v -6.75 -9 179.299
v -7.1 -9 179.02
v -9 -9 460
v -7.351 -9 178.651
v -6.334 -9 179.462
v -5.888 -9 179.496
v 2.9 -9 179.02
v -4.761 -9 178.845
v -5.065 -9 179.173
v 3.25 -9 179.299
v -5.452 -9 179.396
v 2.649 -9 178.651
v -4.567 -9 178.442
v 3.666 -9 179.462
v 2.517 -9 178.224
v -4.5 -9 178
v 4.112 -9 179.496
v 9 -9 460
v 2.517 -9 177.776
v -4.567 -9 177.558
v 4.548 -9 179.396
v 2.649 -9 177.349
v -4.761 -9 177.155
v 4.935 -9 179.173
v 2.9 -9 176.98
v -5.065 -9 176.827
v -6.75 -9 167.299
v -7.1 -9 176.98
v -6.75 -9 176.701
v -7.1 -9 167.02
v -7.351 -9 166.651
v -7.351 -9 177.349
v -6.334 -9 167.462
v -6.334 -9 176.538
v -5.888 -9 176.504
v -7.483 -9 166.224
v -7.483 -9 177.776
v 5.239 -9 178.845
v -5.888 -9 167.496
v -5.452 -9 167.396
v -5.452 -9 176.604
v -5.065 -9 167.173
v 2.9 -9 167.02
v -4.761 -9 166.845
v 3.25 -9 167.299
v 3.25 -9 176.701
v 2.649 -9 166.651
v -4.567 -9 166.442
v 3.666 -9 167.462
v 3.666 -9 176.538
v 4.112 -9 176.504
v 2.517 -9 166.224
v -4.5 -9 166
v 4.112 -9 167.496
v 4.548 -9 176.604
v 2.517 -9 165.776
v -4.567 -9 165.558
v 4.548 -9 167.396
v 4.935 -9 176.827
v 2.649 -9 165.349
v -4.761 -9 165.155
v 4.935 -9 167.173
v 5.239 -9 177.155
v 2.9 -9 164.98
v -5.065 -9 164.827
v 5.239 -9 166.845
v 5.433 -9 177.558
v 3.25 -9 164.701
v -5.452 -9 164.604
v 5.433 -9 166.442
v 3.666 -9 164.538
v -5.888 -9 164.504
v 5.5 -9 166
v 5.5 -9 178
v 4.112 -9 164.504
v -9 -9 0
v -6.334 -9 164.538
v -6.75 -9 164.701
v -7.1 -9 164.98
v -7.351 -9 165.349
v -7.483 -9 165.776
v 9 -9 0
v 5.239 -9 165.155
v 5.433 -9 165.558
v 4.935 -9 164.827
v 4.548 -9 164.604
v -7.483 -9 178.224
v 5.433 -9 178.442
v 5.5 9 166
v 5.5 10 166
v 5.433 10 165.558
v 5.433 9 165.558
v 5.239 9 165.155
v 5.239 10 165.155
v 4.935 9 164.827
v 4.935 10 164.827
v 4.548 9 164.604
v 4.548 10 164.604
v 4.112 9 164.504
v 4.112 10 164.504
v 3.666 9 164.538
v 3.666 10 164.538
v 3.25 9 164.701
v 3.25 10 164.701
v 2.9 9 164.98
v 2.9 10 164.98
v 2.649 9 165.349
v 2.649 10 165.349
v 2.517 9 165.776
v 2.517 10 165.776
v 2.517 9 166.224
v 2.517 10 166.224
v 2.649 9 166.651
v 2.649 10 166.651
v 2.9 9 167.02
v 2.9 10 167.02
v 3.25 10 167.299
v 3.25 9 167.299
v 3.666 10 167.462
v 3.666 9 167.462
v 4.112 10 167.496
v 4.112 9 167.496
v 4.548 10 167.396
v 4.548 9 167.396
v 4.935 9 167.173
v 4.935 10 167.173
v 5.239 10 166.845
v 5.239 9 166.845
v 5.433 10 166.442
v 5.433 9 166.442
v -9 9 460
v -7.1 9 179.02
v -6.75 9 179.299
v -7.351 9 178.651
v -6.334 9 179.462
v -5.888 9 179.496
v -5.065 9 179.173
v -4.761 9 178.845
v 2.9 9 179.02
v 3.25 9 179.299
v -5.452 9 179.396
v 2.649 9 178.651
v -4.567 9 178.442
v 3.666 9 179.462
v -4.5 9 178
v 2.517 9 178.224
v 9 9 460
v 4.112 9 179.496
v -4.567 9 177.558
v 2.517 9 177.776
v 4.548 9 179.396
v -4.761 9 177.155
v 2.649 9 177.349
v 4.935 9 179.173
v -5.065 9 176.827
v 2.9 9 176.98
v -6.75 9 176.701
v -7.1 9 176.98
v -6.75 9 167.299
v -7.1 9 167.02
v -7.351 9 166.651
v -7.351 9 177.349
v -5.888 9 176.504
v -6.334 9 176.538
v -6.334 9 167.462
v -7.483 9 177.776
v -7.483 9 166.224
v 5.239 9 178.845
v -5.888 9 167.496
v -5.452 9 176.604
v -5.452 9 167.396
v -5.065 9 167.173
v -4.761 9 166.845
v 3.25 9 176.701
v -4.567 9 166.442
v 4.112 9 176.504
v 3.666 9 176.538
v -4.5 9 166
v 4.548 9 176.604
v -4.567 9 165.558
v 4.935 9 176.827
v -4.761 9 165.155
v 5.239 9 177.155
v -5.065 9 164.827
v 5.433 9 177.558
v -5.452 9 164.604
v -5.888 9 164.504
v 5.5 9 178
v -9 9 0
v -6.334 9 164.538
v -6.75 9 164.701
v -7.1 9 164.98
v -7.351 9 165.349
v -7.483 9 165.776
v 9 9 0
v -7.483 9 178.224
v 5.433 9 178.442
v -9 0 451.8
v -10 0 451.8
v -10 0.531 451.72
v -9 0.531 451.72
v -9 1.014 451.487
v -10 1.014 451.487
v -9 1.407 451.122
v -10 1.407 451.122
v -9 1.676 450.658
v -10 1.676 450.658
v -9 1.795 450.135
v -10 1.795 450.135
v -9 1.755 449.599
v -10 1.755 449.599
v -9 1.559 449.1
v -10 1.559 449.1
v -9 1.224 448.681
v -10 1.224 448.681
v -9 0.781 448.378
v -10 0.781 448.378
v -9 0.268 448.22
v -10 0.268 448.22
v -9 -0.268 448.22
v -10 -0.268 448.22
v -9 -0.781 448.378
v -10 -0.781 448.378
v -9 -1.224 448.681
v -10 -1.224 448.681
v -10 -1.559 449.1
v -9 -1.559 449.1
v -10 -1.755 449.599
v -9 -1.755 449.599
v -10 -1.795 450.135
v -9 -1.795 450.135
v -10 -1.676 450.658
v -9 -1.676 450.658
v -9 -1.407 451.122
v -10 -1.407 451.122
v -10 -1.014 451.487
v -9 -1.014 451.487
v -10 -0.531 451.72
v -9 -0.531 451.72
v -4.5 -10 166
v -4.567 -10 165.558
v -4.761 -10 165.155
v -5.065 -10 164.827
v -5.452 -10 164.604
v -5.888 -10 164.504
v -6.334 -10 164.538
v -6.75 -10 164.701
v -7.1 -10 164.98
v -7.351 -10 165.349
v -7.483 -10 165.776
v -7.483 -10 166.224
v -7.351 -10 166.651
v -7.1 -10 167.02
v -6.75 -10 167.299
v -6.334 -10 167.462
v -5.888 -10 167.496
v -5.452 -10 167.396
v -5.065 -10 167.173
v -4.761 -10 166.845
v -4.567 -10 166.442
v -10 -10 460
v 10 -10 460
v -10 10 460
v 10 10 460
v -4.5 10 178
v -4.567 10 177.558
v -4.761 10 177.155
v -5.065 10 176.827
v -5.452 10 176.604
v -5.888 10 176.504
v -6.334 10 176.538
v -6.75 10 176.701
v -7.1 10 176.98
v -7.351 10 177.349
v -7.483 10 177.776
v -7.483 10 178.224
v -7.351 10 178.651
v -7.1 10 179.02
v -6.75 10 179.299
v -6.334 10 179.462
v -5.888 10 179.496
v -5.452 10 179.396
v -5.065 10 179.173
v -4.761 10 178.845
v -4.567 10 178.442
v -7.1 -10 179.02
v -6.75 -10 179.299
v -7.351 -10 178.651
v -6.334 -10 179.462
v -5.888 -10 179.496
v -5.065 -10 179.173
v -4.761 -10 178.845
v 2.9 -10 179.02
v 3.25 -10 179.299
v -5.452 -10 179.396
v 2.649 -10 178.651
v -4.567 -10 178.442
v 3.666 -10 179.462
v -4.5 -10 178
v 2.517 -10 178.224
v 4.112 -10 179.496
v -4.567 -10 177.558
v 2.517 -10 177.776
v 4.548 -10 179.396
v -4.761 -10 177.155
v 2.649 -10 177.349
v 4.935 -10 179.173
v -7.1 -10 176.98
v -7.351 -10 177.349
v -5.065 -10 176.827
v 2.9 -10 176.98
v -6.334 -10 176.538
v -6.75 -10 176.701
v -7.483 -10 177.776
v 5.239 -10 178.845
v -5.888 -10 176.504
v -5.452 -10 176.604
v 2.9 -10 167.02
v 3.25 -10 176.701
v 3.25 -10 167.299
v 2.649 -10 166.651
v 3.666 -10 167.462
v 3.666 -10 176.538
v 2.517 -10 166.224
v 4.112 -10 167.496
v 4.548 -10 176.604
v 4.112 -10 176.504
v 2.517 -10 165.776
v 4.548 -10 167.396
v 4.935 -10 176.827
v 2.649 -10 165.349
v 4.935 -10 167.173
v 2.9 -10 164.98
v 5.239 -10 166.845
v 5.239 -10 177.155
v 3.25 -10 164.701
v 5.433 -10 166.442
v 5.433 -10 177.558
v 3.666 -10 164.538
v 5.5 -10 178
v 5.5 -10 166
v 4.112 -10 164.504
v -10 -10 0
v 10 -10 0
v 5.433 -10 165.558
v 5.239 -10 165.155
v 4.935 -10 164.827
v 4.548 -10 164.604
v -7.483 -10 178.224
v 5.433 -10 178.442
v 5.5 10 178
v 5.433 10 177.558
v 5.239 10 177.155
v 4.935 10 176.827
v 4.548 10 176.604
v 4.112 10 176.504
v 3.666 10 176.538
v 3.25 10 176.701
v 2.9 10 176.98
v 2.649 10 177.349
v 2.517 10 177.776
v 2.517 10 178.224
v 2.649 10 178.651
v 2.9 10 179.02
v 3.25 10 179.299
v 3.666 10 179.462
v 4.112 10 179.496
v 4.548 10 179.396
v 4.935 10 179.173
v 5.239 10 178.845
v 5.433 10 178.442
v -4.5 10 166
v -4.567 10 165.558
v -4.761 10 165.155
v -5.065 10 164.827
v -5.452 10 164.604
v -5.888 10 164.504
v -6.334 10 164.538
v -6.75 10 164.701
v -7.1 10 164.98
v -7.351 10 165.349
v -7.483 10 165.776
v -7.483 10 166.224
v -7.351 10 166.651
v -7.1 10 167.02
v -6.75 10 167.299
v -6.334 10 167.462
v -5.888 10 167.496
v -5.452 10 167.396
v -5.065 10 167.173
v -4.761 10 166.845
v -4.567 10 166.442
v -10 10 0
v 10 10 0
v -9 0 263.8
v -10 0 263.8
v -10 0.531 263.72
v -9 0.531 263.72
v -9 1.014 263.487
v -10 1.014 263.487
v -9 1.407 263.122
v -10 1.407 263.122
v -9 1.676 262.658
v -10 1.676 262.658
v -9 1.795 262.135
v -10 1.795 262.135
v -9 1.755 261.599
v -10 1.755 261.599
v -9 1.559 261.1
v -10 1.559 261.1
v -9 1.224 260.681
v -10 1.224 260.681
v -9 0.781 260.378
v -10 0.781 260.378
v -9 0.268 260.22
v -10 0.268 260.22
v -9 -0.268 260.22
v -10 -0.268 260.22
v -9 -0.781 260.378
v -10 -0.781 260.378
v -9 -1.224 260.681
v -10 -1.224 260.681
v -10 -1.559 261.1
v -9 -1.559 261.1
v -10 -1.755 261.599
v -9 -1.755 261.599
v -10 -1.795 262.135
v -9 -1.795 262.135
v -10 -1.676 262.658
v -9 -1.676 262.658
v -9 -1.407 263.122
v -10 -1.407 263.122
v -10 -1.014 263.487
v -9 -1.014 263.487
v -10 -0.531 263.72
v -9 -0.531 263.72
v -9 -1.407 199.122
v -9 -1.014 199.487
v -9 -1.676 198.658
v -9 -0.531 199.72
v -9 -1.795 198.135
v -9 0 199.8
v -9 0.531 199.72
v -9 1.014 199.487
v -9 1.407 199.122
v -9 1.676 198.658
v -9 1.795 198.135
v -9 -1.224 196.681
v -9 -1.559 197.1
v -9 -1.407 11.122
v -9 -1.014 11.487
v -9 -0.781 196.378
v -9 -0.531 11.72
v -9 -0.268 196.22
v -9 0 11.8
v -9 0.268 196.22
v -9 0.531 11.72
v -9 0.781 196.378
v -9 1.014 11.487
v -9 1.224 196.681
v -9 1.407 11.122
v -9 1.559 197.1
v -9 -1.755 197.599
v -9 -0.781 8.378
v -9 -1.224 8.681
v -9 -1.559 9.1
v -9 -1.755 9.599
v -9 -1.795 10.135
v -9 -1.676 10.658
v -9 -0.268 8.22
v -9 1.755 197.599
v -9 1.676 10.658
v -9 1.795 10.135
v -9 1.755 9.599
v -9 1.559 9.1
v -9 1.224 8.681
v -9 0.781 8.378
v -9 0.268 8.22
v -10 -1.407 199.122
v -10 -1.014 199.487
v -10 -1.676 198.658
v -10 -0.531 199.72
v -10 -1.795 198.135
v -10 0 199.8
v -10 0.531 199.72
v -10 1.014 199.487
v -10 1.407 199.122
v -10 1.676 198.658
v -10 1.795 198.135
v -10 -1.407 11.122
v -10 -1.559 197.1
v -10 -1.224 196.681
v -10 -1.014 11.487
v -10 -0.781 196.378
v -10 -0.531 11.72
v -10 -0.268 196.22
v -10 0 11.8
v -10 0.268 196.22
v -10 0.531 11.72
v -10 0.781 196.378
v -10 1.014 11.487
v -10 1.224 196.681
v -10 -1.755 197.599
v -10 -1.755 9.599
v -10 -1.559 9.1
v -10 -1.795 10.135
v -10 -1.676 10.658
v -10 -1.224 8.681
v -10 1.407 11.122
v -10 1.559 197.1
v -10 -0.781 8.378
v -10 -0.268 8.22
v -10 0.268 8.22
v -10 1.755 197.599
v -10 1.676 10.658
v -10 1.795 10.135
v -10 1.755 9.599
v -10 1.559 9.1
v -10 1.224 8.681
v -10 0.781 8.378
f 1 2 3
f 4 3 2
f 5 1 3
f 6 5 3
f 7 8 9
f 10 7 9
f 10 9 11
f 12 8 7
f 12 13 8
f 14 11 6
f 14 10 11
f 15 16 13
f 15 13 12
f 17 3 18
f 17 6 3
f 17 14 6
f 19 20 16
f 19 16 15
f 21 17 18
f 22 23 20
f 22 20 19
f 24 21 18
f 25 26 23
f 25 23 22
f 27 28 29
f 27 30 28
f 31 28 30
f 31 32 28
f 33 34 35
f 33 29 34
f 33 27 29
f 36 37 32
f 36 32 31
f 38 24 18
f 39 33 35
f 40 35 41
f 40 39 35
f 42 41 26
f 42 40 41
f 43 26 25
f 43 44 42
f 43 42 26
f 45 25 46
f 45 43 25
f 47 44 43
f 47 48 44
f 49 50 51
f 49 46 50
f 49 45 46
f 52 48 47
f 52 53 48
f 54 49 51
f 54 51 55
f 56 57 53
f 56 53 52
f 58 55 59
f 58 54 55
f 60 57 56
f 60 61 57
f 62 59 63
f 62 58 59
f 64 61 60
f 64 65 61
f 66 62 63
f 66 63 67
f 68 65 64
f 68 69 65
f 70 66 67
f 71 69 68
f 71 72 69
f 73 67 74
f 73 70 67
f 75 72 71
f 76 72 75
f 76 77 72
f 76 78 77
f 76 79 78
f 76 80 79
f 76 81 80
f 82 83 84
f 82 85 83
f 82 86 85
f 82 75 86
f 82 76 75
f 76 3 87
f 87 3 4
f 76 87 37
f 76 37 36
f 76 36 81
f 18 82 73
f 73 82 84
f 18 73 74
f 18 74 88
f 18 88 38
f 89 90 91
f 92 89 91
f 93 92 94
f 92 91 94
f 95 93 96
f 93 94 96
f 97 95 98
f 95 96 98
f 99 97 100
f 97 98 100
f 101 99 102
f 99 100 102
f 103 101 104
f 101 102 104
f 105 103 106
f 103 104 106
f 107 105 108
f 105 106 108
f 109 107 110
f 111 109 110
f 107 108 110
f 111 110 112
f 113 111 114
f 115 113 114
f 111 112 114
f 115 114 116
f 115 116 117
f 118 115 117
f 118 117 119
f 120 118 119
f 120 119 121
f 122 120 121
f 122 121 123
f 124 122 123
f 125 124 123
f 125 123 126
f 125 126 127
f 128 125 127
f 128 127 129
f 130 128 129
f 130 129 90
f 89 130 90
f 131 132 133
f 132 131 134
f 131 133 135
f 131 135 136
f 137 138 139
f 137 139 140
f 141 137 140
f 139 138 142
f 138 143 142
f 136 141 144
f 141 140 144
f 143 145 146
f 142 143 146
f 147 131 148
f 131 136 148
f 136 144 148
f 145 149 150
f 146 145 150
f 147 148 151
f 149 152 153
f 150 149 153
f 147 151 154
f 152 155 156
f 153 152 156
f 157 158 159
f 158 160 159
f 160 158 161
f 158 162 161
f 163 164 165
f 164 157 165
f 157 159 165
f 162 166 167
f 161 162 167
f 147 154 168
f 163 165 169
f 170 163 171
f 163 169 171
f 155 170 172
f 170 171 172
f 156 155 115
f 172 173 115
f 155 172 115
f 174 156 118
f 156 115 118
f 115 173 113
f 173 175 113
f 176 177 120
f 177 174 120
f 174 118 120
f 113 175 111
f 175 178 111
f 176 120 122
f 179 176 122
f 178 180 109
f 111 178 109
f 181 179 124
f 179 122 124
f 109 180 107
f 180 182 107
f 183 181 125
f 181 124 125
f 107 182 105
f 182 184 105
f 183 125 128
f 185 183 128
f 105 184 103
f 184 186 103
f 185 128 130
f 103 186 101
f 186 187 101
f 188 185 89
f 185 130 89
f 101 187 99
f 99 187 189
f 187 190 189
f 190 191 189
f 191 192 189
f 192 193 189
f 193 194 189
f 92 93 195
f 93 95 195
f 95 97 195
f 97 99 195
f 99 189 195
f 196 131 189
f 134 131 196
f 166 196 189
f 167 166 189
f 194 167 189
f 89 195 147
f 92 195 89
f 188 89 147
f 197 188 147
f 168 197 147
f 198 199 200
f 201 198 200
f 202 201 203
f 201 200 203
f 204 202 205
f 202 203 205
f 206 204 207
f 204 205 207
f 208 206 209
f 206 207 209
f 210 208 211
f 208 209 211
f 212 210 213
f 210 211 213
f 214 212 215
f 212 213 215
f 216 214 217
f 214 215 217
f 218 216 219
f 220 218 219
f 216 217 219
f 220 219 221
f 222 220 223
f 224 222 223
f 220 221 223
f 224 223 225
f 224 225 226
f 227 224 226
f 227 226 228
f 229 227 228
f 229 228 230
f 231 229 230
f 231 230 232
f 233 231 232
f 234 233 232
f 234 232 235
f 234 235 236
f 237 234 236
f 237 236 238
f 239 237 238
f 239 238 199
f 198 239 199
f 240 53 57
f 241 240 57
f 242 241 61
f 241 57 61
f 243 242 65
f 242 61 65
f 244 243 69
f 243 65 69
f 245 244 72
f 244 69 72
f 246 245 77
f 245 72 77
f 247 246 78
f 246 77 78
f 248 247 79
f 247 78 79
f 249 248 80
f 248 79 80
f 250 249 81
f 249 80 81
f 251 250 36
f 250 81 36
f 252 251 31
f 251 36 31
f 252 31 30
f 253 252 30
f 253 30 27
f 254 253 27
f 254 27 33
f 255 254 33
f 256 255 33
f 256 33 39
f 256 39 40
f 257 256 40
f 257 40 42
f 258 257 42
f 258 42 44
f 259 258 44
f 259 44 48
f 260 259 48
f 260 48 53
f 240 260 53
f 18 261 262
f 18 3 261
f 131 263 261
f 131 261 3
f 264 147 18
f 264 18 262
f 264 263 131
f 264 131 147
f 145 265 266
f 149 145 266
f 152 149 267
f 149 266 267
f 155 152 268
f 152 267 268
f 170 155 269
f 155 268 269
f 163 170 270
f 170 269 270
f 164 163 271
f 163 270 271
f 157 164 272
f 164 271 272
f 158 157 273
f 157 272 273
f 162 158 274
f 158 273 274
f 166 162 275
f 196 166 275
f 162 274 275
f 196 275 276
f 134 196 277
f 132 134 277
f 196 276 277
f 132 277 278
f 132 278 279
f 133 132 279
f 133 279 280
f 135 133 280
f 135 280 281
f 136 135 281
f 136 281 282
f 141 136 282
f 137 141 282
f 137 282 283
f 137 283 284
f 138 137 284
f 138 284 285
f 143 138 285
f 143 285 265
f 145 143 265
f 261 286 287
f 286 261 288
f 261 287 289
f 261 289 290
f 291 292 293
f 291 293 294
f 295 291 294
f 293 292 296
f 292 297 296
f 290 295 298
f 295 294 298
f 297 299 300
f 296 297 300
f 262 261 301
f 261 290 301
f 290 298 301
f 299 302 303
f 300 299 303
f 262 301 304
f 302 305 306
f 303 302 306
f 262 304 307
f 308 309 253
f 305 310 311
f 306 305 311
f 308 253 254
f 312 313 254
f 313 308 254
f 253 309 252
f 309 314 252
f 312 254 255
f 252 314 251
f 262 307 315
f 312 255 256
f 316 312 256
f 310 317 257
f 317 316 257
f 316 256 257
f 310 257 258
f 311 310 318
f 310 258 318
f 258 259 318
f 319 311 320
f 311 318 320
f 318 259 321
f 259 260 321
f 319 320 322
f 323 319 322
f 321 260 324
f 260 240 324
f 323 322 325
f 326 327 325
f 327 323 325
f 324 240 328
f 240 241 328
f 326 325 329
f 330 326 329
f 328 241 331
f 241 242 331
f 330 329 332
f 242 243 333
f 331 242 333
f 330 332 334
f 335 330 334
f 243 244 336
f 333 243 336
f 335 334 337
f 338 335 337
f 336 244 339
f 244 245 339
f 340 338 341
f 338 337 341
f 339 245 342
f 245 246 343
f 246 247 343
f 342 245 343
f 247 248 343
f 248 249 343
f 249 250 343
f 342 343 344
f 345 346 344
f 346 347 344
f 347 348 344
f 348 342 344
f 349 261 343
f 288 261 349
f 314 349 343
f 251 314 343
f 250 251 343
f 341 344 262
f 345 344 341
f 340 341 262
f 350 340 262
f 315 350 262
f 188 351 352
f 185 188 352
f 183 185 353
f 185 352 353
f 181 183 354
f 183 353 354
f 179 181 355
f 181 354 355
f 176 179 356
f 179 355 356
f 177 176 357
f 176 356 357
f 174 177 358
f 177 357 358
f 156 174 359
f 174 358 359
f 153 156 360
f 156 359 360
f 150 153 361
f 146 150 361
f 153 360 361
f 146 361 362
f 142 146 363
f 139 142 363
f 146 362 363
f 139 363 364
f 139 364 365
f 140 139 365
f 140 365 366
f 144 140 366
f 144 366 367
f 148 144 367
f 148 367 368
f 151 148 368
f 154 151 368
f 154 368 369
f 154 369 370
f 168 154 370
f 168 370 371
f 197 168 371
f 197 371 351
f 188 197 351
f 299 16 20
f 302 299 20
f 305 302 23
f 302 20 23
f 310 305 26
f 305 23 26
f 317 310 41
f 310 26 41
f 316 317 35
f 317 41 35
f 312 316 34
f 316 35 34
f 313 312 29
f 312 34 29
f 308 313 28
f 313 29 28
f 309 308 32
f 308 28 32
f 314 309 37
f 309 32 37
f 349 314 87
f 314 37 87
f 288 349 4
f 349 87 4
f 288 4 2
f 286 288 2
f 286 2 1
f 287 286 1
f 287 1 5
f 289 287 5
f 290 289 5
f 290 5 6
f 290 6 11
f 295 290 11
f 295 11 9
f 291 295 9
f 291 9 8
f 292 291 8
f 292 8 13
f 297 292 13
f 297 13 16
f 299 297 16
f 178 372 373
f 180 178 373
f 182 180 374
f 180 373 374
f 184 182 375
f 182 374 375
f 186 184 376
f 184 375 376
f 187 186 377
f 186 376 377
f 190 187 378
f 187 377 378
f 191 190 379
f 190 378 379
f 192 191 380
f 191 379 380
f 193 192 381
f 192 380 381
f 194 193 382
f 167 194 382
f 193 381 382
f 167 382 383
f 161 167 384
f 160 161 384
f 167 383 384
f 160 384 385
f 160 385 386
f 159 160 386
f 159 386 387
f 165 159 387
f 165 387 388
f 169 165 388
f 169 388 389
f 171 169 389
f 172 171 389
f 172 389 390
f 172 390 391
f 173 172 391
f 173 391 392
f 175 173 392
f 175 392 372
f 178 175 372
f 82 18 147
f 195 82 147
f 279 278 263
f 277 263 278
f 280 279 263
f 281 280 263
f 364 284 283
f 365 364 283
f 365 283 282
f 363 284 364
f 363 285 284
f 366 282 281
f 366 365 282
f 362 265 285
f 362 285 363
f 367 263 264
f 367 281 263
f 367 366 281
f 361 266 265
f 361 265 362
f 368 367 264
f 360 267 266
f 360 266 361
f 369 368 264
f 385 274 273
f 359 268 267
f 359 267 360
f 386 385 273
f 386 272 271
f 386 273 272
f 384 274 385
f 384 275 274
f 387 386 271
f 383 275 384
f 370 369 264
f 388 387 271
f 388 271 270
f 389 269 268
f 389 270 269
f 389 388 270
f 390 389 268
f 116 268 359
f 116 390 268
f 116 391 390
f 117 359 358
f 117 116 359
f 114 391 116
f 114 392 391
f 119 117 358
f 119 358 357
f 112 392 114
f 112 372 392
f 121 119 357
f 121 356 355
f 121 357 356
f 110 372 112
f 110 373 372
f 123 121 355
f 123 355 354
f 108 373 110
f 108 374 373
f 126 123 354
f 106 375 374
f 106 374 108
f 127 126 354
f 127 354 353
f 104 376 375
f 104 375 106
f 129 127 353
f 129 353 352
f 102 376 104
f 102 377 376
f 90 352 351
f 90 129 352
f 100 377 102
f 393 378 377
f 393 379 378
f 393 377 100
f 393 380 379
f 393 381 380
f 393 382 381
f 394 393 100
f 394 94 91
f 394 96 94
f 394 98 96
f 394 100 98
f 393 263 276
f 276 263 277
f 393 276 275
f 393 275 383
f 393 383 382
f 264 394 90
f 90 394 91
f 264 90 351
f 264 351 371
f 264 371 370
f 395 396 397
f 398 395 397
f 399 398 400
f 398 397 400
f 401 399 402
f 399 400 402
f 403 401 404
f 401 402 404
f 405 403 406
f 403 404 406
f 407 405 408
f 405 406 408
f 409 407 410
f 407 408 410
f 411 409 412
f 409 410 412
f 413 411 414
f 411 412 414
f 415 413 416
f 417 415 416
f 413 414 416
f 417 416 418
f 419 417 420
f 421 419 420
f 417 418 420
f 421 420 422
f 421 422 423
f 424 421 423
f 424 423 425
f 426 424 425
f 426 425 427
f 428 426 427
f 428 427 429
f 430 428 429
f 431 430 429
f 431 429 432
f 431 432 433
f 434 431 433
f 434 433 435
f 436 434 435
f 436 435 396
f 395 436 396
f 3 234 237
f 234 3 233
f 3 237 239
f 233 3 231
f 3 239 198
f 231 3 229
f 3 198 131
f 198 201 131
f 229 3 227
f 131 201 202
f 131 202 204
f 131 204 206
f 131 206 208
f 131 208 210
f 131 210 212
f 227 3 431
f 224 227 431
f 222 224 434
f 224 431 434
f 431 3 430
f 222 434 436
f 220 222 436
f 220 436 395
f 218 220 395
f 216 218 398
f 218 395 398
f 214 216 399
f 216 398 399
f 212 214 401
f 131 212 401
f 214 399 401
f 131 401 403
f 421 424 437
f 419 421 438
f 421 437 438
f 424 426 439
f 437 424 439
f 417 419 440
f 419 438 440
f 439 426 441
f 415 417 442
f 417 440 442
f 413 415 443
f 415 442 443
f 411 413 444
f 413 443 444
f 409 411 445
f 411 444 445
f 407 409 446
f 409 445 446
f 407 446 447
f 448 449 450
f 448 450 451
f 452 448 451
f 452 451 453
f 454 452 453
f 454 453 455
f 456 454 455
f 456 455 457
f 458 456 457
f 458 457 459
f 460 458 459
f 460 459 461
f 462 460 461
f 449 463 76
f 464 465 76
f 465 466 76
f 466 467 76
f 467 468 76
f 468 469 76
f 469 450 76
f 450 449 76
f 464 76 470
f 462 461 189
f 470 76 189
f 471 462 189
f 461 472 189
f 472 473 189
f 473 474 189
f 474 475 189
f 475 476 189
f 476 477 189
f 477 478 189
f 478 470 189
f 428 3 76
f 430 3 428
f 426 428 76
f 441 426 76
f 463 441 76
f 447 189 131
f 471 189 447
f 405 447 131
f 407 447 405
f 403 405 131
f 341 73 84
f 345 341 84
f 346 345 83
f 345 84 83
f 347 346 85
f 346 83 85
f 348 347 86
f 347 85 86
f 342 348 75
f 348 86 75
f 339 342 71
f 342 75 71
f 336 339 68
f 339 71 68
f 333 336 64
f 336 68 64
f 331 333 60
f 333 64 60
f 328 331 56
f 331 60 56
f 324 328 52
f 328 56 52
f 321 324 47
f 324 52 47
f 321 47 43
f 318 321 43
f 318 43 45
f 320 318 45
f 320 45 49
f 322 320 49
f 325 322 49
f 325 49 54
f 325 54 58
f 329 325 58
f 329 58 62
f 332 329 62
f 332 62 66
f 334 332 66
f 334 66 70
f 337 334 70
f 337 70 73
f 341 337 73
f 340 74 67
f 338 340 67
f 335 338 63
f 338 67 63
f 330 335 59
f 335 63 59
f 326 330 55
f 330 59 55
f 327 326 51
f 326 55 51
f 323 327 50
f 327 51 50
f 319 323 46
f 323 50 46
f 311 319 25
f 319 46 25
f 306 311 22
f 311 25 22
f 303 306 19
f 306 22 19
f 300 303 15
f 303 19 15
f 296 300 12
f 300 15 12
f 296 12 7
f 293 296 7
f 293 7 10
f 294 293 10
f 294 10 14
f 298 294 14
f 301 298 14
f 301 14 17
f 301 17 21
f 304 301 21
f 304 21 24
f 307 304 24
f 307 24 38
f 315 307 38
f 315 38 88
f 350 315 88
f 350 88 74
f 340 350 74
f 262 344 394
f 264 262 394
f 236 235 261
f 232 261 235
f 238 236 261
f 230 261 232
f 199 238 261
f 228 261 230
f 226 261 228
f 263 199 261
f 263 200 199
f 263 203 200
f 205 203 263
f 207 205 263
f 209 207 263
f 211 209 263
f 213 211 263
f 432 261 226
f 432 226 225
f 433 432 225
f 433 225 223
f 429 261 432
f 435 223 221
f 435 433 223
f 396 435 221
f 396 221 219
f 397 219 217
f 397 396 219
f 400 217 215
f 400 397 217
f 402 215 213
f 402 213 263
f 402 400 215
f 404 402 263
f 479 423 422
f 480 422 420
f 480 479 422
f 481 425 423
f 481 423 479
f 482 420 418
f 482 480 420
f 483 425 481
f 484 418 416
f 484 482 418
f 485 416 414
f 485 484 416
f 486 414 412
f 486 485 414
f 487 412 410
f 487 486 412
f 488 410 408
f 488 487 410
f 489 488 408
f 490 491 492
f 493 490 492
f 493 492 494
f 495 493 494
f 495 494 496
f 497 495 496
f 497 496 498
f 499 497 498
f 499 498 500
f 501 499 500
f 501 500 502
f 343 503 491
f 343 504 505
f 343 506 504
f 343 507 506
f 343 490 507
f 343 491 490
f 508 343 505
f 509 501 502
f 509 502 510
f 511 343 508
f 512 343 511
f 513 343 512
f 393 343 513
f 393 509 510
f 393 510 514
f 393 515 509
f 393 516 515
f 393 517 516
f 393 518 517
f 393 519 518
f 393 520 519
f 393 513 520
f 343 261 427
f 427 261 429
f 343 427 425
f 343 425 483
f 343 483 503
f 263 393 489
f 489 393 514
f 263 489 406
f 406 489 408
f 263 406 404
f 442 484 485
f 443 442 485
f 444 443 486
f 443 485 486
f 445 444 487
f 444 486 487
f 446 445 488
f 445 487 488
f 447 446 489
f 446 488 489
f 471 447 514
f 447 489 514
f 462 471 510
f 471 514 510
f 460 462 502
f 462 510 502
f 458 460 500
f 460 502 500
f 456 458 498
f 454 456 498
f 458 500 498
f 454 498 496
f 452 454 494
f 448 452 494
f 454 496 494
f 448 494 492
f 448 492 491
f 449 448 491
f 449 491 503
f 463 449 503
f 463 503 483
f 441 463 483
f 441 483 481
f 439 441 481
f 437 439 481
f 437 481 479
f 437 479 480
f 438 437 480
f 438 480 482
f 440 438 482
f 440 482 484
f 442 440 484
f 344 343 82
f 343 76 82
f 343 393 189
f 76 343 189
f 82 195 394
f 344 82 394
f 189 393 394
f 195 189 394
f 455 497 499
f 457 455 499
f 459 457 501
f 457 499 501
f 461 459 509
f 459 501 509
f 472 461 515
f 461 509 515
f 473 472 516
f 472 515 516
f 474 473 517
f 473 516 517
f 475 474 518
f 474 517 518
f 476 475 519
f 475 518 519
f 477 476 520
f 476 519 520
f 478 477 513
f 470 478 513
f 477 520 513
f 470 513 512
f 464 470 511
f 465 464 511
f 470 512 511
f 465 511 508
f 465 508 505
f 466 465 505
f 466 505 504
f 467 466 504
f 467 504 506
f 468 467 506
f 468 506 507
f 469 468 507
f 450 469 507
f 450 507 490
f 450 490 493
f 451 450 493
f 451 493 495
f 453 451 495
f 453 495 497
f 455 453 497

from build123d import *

# Parameters (mm, degrees)
SKETCH_1_W          = 20
SKETCH_1_H          = 20
SKETCH_1_W_2        = 18
SKETCH_1_H_2        = 18
EXTRUDE_1_DEPTH     = 460
SKETCH_2_R          = 1.8
CUT_EXTRUDE_1_DEPTH = 3
SKETCH_3_R          = 1.8
CUT_EXTRUDE_2_DEPTH = 3
SKETCH_5_R          = 1.8
CUT_EXTRUDE_3_DEPTH = 3
SKETCH_6_R          = 1.8
CUT_EXTRUDE_4_DEPTH = 10
SKETCH_7_R          = 1.5
CUT_EXTRUDE_5_DEPTH = 20


with BuildPart() as part:
    # 草图1 → 凸台-拉伸1 (new body)
    with BuildSketch(Plane.XY):
        Rectangle(SKETCH_1_W, SKETCH_1_H)
        Rectangle(SKETCH_1_W_2, SKETCH_1_H_2, mode=Mode.SUBTRACT)
    extrude(amount=EXTRUDE_1_DEPTH)

    # 草图2 → 切除-拉伸1 (cut)
    with BuildSketch(Plane.ZY.offset(10)):
        with Locations((10, 0)):
            Circle(SKETCH_2_R)
    extrude(amount=-CUT_EXTRUDE_1_DEPTH, mode=Mode.SUBTRACT)

    # 草图3 → 切除-拉伸2 (cut)
    with BuildSketch(Plane.ZY.offset(10)):
        with Locations((198, 0)):
            Circle(SKETCH_3_R)
    extrude(amount=-CUT_EXTRUDE_2_DEPTH, mode=Mode.SUBTRACT)

    # 草图5 → 切除-拉伸3 (cut)
    with BuildSketch(Plane.ZY.offset(10)):
        with Locations((450, 0)):
            Circle(SKETCH_5_R)
    extrude(amount=-CUT_EXTRUDE_3_DEPTH, mode=Mode.SUBTRACT)

    # 草图6 → 切除-拉伸4 (cut)
    with BuildSketch(Plane.ZY.offset(10)):
        with Locations((262, 0)):
            Circle(SKETCH_6_R)
    extrude(amount=-CUT_EXTRUDE_4_DEPTH, mode=Mode.SUBTRACT)

    # 草图7 → 切除-拉伸5 (cut)
    with BuildSketch(Plane(origin=(0, 10, 0), x_dir=(1, 0, 0), z_dir=(0, 1, 0))):
        with Locations((4, -166)):
            Circle(SKETCH_7_R)
        with Locations((-6, -166)):
            Circle(SKETCH_7_R)
        with Locations((4, -178)):
            Circle(SKETCH_7_R)
        with Locations((-6, -178)):
            Circle(SKETCH_7_R)
    extrude(amount=-CUT_EXTRUDE_5_DEPTH, mode=Mode.SUBTRACT)


solid = part.part
